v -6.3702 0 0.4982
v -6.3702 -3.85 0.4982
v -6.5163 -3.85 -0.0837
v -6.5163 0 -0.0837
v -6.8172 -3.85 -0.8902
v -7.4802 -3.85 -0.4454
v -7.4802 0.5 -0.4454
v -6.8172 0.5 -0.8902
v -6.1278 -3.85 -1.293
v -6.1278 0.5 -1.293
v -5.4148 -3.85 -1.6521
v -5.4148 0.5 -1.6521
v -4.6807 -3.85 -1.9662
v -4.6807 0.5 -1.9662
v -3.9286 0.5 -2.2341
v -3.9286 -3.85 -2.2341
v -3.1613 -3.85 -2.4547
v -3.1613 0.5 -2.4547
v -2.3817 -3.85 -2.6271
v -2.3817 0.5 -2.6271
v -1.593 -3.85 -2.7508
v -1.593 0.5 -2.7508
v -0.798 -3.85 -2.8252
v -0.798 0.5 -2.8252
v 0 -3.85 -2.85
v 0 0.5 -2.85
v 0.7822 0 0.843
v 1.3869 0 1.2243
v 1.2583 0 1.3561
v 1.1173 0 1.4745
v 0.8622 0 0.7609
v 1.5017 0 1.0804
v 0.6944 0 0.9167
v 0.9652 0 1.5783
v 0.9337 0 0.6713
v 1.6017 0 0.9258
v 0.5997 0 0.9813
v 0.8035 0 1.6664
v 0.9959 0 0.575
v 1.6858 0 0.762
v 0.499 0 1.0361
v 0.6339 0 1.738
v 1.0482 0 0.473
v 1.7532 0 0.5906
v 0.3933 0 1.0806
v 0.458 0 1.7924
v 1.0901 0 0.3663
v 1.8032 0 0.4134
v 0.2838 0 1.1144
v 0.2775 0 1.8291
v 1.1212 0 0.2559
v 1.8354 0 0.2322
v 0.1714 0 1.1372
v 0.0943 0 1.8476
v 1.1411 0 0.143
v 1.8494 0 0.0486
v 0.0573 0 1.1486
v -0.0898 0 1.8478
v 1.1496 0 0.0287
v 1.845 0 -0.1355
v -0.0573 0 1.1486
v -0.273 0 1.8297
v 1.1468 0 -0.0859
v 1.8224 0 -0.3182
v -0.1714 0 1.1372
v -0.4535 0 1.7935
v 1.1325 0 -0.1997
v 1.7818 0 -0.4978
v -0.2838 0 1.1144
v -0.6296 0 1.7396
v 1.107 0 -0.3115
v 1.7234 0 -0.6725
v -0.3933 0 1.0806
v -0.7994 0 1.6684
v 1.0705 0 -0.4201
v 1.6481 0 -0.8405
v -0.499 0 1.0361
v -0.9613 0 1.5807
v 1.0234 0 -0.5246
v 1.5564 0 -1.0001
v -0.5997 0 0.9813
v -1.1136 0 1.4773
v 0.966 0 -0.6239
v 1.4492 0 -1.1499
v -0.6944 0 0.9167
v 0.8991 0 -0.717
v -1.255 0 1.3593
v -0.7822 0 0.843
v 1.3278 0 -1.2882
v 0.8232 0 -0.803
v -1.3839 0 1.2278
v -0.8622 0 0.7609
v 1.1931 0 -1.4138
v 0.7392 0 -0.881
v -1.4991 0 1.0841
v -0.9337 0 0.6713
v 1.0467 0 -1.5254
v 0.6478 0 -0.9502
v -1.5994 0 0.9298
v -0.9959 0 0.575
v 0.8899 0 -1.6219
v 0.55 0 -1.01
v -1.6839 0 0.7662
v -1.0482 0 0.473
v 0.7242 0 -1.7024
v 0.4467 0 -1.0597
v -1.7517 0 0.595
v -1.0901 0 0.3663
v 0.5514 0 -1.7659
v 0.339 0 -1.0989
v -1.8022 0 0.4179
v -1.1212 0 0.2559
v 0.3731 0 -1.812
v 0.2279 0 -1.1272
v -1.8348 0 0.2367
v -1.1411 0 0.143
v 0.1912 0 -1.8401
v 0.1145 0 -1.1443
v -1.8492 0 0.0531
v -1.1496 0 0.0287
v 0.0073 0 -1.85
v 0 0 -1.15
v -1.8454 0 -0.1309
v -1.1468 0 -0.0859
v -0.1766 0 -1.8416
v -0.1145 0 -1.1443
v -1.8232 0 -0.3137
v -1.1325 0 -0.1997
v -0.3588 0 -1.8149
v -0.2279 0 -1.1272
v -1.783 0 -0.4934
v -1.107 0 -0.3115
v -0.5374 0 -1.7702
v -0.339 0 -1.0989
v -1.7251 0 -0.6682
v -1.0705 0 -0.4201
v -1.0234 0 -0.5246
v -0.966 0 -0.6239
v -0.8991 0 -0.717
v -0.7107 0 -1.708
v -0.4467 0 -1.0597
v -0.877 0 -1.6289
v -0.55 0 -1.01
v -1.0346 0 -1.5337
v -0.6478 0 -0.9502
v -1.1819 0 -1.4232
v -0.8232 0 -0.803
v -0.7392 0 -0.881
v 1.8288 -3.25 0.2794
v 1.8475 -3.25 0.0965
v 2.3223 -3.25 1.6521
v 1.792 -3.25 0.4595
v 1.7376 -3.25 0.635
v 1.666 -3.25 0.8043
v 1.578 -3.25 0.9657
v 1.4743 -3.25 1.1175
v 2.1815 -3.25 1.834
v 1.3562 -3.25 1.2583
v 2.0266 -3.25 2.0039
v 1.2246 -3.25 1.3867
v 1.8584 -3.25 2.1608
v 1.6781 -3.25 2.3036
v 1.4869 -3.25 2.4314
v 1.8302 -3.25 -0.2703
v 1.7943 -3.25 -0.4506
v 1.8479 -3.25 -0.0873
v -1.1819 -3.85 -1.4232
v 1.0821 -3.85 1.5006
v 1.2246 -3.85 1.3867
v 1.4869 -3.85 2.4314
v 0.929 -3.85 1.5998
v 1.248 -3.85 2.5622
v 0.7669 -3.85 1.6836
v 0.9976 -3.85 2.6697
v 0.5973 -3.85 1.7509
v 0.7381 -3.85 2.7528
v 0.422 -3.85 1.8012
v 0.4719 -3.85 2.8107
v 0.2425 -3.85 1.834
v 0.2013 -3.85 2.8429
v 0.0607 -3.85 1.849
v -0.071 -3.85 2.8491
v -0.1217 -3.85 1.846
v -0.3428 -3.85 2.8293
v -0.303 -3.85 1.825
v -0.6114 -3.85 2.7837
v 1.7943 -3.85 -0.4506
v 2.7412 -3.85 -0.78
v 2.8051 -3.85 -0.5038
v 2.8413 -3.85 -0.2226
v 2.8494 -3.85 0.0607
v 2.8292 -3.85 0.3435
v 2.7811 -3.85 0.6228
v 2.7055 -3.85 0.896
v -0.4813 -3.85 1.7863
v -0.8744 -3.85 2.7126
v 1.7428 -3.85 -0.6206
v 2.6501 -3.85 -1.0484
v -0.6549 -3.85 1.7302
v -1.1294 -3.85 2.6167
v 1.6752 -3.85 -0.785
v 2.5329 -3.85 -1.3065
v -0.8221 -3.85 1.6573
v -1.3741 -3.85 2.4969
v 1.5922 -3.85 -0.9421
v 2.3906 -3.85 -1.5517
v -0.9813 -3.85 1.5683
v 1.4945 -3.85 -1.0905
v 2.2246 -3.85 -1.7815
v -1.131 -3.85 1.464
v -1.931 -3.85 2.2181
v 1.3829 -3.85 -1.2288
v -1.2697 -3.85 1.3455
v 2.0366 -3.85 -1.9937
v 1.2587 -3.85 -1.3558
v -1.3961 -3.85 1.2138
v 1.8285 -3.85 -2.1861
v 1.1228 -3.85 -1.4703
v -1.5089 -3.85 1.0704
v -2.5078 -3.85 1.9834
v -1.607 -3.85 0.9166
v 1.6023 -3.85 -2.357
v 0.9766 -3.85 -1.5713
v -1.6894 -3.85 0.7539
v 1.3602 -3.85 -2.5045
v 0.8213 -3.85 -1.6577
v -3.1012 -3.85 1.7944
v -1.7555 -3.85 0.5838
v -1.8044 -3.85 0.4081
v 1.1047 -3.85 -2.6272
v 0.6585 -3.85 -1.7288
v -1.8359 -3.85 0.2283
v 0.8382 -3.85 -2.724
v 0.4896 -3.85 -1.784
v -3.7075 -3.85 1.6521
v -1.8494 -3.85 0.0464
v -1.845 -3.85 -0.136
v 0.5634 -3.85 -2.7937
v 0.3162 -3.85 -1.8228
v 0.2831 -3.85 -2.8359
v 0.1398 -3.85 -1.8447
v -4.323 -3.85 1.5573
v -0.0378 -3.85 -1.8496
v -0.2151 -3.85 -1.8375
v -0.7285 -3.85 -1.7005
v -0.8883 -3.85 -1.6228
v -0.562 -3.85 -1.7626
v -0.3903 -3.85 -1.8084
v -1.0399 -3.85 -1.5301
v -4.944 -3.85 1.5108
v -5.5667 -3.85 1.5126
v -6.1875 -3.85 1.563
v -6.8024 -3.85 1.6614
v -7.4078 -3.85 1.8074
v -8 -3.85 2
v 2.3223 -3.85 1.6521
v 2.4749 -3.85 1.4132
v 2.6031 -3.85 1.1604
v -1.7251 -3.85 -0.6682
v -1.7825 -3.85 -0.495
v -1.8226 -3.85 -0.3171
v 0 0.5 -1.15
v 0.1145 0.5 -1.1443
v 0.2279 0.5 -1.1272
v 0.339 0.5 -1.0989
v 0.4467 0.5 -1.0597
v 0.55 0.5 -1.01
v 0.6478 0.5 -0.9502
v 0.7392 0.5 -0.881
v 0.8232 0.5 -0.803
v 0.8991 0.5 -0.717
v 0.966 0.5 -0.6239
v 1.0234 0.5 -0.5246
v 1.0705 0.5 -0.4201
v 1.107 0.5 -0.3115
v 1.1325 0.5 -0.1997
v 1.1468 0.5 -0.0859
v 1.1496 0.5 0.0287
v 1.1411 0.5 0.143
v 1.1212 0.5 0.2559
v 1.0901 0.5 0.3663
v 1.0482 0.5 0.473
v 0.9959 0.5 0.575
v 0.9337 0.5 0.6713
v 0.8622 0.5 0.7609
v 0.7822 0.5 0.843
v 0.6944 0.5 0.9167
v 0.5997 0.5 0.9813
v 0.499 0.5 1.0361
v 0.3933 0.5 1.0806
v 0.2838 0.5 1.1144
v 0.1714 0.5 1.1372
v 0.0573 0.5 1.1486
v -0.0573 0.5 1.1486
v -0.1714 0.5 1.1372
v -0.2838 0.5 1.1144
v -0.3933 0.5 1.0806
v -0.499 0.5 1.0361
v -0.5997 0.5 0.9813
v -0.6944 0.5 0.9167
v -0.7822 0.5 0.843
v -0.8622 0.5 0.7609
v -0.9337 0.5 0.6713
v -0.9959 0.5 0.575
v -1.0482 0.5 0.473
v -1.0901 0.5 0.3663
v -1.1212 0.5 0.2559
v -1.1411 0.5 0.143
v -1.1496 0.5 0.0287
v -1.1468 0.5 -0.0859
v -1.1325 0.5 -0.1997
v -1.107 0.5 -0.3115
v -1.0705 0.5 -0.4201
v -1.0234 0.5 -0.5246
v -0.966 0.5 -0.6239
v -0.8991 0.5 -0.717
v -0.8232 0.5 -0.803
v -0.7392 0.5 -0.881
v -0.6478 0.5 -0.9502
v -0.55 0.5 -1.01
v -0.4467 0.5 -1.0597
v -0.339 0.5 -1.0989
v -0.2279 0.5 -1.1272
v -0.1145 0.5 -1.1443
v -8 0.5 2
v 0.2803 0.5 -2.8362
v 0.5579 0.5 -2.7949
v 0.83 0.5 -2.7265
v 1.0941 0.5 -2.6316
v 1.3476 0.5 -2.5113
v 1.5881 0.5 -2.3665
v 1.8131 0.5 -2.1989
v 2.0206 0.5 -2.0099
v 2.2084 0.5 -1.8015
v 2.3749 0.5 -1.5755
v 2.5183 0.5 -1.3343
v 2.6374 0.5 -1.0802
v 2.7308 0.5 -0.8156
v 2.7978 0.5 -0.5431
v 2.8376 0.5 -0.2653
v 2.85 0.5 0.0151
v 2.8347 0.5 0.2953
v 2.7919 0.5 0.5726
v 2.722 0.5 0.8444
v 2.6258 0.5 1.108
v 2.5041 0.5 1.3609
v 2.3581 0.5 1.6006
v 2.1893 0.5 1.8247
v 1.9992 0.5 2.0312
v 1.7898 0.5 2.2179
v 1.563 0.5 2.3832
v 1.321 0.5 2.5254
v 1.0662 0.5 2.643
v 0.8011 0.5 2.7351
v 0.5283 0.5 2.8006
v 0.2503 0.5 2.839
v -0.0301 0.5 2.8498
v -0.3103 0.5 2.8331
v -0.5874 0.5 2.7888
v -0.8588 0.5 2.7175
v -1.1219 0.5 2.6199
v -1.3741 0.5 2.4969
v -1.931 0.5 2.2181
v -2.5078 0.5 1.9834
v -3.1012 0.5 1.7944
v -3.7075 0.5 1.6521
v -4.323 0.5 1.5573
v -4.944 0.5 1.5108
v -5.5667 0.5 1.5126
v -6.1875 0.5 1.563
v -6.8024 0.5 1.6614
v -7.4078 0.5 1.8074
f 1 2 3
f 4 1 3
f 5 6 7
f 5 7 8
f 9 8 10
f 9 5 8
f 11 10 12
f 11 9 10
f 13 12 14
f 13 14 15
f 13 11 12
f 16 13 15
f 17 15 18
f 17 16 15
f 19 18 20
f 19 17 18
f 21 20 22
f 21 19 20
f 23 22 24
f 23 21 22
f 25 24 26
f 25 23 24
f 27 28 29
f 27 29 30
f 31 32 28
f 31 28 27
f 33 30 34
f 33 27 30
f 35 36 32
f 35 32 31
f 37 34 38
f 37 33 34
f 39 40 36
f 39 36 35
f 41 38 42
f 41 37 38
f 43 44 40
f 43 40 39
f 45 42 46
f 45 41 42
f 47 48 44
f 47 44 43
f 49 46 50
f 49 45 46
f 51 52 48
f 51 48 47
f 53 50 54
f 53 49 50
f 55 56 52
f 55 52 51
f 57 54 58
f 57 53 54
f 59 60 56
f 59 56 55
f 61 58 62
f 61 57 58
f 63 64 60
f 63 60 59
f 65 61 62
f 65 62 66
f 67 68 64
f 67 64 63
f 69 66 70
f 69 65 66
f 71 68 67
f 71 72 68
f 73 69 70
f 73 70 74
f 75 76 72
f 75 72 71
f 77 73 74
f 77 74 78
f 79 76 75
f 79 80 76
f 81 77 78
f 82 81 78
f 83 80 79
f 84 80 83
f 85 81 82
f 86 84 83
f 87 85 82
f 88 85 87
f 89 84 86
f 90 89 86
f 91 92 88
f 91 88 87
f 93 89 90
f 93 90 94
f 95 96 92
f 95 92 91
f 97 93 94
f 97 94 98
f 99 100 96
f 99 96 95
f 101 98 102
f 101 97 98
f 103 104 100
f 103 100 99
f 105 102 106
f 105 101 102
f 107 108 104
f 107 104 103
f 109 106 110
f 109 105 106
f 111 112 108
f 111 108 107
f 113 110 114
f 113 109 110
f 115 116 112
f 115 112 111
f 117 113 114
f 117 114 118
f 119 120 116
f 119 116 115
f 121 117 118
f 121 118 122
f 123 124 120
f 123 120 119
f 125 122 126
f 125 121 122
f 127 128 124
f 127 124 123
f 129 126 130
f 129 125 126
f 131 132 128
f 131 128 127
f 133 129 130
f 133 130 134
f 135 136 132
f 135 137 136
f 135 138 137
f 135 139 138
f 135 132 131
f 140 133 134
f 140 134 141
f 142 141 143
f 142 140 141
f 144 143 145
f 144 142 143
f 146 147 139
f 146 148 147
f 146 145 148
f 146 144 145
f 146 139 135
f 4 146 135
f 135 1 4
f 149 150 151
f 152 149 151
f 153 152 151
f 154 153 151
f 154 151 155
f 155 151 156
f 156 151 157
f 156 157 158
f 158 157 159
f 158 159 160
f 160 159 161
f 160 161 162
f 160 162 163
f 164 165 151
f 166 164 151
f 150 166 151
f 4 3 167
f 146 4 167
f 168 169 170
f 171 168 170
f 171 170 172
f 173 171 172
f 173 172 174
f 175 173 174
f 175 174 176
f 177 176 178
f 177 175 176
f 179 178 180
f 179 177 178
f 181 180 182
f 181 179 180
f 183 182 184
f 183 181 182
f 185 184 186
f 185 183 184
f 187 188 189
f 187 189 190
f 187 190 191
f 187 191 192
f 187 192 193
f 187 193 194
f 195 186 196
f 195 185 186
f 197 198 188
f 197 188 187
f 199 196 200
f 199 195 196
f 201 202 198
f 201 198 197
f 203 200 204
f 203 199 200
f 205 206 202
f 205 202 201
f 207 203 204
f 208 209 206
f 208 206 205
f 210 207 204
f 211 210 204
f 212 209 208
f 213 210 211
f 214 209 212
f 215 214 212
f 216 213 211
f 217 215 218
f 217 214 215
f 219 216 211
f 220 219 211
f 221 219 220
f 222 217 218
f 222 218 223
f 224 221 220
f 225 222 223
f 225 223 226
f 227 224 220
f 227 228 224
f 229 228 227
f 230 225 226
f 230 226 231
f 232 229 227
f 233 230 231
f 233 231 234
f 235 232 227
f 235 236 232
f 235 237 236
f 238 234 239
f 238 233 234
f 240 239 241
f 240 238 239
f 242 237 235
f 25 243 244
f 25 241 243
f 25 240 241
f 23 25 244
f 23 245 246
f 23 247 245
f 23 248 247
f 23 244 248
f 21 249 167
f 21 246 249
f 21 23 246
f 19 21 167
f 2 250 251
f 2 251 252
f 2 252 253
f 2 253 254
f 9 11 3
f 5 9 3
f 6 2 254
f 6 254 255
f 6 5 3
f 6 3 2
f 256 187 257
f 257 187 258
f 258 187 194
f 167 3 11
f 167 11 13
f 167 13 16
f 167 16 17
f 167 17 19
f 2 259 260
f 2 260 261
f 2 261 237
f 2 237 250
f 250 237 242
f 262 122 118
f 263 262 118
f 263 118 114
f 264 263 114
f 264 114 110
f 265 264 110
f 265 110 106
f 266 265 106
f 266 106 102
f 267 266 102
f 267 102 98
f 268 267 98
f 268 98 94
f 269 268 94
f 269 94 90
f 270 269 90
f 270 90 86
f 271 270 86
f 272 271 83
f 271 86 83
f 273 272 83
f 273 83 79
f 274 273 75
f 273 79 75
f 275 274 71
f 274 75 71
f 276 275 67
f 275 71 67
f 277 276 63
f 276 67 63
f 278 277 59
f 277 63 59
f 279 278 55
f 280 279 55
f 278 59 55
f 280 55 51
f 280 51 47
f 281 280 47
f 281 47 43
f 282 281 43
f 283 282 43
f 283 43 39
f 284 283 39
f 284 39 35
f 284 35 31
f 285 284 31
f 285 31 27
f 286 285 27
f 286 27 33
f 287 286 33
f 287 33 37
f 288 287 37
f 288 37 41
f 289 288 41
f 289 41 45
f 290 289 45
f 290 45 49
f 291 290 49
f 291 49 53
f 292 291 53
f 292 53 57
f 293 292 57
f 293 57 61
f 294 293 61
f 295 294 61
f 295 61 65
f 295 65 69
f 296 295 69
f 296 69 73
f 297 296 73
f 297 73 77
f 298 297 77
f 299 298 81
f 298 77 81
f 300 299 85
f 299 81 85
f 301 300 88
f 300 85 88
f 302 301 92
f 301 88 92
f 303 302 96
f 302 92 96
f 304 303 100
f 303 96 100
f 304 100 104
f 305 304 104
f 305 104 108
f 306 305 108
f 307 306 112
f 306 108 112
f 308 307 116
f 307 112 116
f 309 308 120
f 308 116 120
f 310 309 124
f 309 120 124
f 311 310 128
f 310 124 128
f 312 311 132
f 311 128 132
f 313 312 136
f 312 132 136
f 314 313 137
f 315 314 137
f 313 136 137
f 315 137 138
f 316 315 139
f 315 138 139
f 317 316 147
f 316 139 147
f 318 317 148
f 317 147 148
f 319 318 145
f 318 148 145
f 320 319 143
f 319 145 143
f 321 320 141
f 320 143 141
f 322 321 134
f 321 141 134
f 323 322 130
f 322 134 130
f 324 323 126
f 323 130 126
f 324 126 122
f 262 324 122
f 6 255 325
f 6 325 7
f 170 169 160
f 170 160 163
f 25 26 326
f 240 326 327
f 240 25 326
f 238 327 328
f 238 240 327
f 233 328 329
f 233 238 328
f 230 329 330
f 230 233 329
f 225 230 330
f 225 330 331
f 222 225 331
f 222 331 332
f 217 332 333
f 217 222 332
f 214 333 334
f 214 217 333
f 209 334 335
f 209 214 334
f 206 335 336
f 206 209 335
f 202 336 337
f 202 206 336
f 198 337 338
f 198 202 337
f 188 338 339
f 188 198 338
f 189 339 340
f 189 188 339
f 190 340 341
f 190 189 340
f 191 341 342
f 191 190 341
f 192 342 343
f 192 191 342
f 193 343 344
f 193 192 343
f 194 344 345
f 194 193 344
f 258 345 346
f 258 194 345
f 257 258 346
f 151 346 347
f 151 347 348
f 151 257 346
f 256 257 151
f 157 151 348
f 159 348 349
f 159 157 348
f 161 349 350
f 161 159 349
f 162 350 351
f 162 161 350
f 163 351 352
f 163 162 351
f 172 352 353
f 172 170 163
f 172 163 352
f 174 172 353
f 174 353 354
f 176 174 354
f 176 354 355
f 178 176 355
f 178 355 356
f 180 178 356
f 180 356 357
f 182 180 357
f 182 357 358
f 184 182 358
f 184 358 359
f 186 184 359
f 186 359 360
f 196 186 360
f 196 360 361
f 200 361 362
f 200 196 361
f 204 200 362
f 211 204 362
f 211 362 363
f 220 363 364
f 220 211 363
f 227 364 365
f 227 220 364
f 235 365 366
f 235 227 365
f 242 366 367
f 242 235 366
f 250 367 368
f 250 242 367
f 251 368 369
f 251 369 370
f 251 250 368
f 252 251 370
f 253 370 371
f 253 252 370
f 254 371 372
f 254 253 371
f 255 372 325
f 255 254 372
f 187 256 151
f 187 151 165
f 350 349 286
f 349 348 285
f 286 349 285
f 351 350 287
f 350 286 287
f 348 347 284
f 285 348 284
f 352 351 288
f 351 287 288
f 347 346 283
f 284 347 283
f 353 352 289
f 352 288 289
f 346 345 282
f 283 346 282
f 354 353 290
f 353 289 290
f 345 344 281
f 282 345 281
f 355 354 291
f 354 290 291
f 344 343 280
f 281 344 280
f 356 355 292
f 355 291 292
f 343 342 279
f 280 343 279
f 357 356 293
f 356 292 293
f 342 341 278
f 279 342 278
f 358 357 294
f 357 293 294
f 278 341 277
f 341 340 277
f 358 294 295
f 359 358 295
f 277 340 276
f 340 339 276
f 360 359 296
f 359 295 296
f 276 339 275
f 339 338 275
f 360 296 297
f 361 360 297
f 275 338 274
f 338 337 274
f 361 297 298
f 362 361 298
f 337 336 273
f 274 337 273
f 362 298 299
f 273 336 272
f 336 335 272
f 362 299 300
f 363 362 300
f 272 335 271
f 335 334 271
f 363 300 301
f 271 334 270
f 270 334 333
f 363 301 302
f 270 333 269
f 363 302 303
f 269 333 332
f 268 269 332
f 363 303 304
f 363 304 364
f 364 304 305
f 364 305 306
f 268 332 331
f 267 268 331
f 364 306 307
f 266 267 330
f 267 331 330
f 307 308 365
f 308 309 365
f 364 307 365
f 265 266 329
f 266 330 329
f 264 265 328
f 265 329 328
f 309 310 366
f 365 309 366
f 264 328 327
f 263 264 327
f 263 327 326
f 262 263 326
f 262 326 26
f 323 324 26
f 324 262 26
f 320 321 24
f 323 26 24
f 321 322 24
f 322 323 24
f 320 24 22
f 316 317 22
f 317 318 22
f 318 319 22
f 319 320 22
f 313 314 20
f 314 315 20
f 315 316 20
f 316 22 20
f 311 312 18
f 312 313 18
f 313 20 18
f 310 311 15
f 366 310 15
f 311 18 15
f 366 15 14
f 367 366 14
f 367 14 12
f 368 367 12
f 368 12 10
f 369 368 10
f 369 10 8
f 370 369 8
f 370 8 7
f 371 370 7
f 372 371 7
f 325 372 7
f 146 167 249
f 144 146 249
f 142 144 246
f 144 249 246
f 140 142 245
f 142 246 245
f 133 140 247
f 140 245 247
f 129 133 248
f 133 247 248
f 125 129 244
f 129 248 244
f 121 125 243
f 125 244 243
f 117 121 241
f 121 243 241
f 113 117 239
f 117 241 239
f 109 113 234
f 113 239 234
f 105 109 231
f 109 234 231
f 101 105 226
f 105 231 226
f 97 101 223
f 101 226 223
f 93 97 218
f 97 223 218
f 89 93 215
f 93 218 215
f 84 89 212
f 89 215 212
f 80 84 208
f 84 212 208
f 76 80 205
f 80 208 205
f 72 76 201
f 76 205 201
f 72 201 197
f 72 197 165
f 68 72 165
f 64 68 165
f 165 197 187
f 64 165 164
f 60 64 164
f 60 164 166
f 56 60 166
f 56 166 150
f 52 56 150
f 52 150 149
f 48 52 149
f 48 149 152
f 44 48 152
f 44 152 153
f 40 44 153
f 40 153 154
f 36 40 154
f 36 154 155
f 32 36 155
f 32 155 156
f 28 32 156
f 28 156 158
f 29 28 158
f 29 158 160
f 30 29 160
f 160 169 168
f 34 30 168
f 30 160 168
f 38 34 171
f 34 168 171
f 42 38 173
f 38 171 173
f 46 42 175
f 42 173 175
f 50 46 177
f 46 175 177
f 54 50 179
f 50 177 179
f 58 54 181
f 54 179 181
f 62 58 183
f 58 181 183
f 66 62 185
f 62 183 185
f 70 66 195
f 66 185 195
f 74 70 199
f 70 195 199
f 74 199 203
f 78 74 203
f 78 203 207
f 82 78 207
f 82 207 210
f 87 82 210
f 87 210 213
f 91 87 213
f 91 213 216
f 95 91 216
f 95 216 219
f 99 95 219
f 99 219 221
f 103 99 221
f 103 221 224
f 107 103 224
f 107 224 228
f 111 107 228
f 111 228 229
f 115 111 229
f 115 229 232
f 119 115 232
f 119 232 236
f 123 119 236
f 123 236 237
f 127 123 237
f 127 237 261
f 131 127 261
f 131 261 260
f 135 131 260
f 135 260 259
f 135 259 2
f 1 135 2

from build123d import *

# Parameters (mm, degrees)
BOSS_EXTRUDE1_DEPTH = 0.5
BOSS_EXTRUDE2_START = -3.85
BOSS_EXTRUDE2_DEPTH = 3.85
SKETCH2_R           = 1.15
CUT_EXTRUDE1_DEPTH  = 10
CUT_EXTRUDE2_START  = 3.85
CUT_EXTRUDE2_DEPTH  = 0.6


with BuildPart() as part:
    # Sketch1 → Boss-Extrude1 (new body)
    with BuildSketch(Plane(origin=(0, 0, 0), x_dir=(1, 0, 0), z_dir=(0, 1, 0))):
        with BuildLine():
            Line((-8, -2), (-7.480220773, 0.445369002))
            ThreePointArc((-7.480220773, 0.445369002), (-3.928611493, 2.234065485), (0, 2.85))
            ThreePointArc((0, 2.85), (2.760304316, -0.709380069), (-1.374108678, -2.4968631))
            ThreePointArc((-1.374108678, -2.4968631), (-4.633030541, -1.528000078), (-8, -2))
        make_face()
    extrude(amount=BOSS_EXTRUDE1_DEPTH)

    # Sketch1<3> → Boss-Extrude2 (add)
    with BuildSketch(Plane(origin=(0, 0, 0), x_dir=(1, 0, 0), z_dir=(0, 1, 0)).offset(BOSS_EXTRUDE2_START)):
        with BuildLine():
            Line((-8, -2), (-7.480220773, 0.445369002))
            ThreePointArc((-7.480220773, 0.445369002), (-3.928611493, 2.234065485), (0, 2.85))
            ThreePointArc((0, 2.85), (2.760304316, -0.709380069), (-1.374108678, -2.4968631))
            ThreePointArc((-1.374108678, -2.4968631), (-4.633030541, -1.528000078), (-8, -2))
        make_face()
        with BuildLine():
            Line((-6.516291445, 0.083732705), (-1.181900943, 1.423239319))
            ThreePointArc((-1.181900943, 1.423239319), (1.501730026, -1.080419793), (-1.725107949, 0.668208473))
            Line((-1.725107949, 0.668208473), (-6.370163451, -0.498200805))
            Line((-6.370163451, -0.498200805), (-6.516291445, 0.083732705))
        make_face(mode=Mode.SUBTRACT)
    extrude(amount=BOSS_EXTRUDE2_DEPTH)

    # Sketch2 → Cut-Extrude1 (cut)
    with BuildSketch(Plane.XZ):
        with Locations(Location((0, 0, 0), (0, 0, 270))):
            Circle(SKETCH2_R)
    extrude(amount=-CUT_EXTRUDE1_DEPTH, mode=Mode.SUBTRACT)

    # Sketch3 → Cut-Extrude2 (cut)
    with BuildSketch(Plane.XZ.offset(CUT_EXTRUDE2_START)):
        with BuildLine():
            Line((1.085530532, 0.832876632), (1.48692434, 2.431369163))
            ThreePointArc((1.48692434, 2.431369163), (1.944053318, 2.08402416), (2.322291558, 1.652108326))
            Line((2.322291558, 1.652108326), (1.794294987, -0.450561316))
            Line((1.794294987, -0.450561316), (1.085530532, 0.832876632))
        make_face()
    extrude(amount=-CUT_EXTRUDE2_DEPTH, mode=Mode.SUBTRACT)


solid = part.part
